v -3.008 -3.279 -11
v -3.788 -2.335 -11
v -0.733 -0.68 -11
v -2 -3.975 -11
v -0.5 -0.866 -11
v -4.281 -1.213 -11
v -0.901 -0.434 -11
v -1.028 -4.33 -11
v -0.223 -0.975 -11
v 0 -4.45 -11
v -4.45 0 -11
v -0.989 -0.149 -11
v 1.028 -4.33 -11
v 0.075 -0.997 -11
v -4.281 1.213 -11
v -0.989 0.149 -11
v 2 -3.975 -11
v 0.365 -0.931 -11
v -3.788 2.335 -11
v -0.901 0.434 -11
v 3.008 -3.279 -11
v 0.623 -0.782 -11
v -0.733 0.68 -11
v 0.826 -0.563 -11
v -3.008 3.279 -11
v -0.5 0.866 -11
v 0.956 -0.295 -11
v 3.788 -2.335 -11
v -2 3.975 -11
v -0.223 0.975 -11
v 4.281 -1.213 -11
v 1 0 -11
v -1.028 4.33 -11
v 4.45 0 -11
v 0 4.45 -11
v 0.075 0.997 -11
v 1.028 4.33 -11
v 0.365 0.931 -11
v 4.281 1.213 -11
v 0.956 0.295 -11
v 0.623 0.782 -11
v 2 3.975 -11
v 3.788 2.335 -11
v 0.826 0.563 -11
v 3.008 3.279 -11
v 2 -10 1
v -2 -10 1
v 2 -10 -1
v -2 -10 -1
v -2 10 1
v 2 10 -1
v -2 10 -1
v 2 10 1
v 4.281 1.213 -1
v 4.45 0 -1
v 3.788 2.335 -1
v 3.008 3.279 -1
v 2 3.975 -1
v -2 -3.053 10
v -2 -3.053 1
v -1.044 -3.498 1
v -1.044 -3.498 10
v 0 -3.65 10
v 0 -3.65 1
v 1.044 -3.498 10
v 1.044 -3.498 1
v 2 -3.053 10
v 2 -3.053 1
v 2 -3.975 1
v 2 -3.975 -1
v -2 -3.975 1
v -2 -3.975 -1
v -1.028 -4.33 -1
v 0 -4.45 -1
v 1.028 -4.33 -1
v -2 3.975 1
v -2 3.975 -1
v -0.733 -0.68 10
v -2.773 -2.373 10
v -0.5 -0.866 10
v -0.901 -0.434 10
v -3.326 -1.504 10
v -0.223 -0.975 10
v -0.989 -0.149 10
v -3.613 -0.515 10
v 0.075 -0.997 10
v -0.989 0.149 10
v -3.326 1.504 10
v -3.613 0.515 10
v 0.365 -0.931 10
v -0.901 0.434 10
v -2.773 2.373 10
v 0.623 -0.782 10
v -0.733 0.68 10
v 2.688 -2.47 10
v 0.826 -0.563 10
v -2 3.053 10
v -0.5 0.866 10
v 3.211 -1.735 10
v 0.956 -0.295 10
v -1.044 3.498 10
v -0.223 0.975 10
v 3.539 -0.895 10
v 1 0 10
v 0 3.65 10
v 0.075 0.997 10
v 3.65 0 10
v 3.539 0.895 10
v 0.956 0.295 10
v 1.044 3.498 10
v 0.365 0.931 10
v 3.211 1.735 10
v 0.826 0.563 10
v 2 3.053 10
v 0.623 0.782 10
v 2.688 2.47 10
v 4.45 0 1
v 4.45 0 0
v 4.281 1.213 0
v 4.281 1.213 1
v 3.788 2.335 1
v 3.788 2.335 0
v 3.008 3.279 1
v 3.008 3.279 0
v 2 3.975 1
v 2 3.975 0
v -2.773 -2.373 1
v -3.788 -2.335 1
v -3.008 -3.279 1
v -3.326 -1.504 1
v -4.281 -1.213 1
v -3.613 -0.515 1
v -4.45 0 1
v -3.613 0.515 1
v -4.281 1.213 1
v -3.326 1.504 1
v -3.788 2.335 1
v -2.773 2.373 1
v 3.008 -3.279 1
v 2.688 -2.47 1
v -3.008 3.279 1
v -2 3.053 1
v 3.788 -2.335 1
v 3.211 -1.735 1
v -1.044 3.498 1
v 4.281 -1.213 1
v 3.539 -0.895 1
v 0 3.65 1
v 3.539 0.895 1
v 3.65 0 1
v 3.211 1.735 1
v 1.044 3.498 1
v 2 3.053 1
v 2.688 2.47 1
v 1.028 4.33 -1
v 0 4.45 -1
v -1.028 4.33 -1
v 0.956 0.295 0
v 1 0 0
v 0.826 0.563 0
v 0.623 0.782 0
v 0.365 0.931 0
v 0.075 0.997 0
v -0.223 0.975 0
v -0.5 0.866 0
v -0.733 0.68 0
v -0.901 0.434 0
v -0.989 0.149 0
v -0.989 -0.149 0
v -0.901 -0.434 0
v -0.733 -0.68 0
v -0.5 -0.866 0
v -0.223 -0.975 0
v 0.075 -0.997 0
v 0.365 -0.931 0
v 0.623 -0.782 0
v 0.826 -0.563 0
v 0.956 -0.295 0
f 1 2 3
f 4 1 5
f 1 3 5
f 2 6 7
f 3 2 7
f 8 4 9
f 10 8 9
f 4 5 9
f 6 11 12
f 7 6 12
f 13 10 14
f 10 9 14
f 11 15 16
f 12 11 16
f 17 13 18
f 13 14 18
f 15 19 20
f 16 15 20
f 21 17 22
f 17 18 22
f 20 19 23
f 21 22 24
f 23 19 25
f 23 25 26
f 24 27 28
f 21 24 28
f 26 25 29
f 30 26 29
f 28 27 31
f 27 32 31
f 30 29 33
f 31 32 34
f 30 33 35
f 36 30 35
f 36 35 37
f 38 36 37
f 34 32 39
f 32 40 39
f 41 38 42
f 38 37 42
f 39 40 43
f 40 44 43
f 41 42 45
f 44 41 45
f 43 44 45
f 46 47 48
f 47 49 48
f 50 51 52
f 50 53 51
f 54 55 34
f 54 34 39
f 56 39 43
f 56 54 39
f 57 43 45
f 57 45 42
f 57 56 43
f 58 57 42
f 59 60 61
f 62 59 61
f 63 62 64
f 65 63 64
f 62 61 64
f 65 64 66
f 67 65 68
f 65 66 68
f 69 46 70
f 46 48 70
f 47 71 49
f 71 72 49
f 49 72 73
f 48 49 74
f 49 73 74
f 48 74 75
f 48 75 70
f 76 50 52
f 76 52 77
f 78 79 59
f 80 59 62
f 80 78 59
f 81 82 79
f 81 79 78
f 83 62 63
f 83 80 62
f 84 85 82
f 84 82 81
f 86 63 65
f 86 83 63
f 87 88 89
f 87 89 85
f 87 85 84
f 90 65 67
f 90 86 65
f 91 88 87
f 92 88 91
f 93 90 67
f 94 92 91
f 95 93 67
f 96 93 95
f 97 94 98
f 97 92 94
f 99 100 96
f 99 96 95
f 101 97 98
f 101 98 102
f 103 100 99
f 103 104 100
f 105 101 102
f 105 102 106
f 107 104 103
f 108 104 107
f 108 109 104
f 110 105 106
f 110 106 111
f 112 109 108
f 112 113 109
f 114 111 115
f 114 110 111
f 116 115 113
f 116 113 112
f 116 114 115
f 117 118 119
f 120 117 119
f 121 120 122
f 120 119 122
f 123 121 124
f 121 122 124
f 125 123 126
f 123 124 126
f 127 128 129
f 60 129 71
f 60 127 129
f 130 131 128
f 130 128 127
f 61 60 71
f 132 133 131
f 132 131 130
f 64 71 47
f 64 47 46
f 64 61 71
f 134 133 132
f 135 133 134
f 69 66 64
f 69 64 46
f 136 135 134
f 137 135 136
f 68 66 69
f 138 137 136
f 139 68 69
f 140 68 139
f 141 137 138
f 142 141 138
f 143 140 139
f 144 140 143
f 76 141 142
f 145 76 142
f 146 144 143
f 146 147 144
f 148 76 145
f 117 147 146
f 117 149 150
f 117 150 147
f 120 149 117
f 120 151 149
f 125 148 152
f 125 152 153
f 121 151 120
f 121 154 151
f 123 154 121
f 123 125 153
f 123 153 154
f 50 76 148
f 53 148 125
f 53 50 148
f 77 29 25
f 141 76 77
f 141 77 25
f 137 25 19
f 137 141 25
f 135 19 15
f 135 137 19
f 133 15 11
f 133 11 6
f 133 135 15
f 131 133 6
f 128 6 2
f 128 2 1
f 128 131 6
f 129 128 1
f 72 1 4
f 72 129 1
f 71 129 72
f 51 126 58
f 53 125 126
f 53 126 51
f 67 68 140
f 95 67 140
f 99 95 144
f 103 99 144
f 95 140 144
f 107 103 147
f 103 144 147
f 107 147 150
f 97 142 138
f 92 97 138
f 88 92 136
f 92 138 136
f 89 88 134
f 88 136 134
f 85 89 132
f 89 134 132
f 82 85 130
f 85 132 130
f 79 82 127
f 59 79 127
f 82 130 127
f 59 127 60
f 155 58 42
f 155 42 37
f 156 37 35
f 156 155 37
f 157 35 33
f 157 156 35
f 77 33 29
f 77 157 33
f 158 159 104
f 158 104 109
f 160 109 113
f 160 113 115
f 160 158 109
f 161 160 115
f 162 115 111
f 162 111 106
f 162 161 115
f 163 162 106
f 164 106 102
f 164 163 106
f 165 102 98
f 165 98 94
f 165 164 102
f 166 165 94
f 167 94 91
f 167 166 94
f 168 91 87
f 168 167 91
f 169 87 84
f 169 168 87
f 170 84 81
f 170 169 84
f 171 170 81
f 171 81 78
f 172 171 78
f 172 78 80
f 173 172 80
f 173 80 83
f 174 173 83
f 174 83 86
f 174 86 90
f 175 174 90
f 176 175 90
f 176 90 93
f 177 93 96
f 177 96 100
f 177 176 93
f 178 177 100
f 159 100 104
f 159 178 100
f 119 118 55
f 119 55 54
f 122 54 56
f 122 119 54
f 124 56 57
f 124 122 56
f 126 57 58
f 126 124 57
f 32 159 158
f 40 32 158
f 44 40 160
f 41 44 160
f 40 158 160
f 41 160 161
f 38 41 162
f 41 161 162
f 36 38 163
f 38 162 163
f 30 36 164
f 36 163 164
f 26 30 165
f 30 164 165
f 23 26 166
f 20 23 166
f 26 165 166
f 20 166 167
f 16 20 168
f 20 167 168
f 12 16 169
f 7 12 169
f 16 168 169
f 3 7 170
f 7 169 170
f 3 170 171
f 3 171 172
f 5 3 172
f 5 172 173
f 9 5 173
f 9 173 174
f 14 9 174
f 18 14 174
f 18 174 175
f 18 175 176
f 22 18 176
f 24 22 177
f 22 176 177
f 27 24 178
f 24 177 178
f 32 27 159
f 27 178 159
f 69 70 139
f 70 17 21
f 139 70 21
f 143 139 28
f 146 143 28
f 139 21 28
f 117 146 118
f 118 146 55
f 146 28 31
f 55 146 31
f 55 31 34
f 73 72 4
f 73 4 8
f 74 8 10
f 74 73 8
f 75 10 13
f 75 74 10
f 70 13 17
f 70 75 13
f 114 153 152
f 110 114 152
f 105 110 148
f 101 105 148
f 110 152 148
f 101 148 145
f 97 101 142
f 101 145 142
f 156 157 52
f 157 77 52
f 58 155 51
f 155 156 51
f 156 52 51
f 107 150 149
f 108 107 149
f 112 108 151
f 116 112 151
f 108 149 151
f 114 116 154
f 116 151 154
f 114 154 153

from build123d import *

# Parameters (mm, degrees)
F0_R     = 1
F1_DEPTH = 11
F2_DEPTH = 1
F3_DEPTH = 10


with BuildPart() as f1:
    # F0 (on Top) → F1 (new body)
    with BuildSketch(Plane.XY):
        with BuildLine():
            Line((-2, 3.0532769282), (-2, 3.9752358421))
            ThreePointArc((-2, 3.9752358421), (-4.45, 0), (-2, -3.9752358421))
            Line((-2, -3.9752358421), (-2, -3.0532769282))
            ThreePointArc((-2, -3.0532769282), (-3.65, 0), (-2, 3.0532769282))
        make_face()
        with BuildLine():
            ThreePointArc((-2, -3.9752358421), (0, -4.45), (2, -3.9752358421))
            Line((2, -3.9752358421), (2, -3.0532769282))
            ThreePointArc((2, -3.0532769282), (0, -3.65), (-2, -3.0532769282))
            Line((-2, -3.0532769282), (-2, -3.9752358421))
        make_face()
        with BuildLine():
            ThreePointArc((2, -3.9752358421), (3.78830437, -2.3347912112), (4.45, 0))
            ThreePointArc((4.45, 0), (3.78830437, 2.3347912112), (2, 3.9752358421))
            Line((2, 3.9752358421), (2, 3.0532769282))
            ThreePointArc((2, 3.0532769282), (3.211113514, 1.7352953639), (3.65, 0))
            ThreePointArc((3.65, 0), (3.211113514, -1.7352953639), (2, -3.0532769282))
            Line((2, -3.0532769282), (2, -3.9752358421))
        make_face()
        with BuildLine():
            Line((2, 3.0532769282), (2, 3.9752358421))
            ThreePointArc((2, 3.9752358421), (0, 4.45), (-2, 3.9752358421))
            Line((-2, 3.9752358421), (-2, 3.0532769282))
            ThreePointArc((-2, 3.0532769282), (0, 3.65), (2, 3.0532769282))
        make_face()
        with BuildLine():
            Line((-2, -3.0532769282), (-2, 3.0532769282))
            ThreePointArc((-2, 3.0532769282), (-3.65, 0), (-2, -3.0532769282))
        make_face()
        with BuildLine():
            Line((2, -3.0532769282), (2, 3.0532769282))
            ThreePointArc((2, 3.0532769282), (0, 3.65), (-2, 3.0532769282))
            Line((-2, 3.0532769282), (-2, -3.0532769282))
            ThreePointArc((-2, -3.0532769282), (0, -3.65), (2, -3.0532769282))
        make_face()
        Circle(F0_R, mode=Mode.SUBTRACT)
        with BuildLine():
            ThreePointArc((3.65, 0), (3.211113514, 1.7352953639), (2, 3.0532769282))
            Line((2, 3.0532769282), (2, -3.0532769282))
            ThreePointArc((2, -3.0532769282), (3.211113514, -1.7352953639), (3.65, 0))
        make_face()
    extrude(amount=-F1_DEPTH)

    # F0 (on Top) → F2 (join, symmetric)
    with BuildSketch(Plane.XY):
        with BuildLine():
            ThreePointArc((-2, 3.9752358421), (0, 4.45), (2, 3.9752358421))
            Line((2, 3.9752358421), (2, 10))
            Line((2, 10), (-2, 10))
            Line((-2, 10), (-2, 3.9752358421))
        make_face()
        with BuildLine():
            Line((2, -10), (2, -3.9752358421))
            ThreePointArc((2, -3.9752358421), (0, -4.45), (-2, -3.9752358421))
            Line((-2, -3.9752358421), (-2, -10))
            Line((-2, -10), (2, -10))
        make_face()
        with BuildLine():
            Line((2, 3.0532769282), (2, 3.9752358421))
            ThreePointArc((2, 3.9752358421), (0, 4.45), (-2, 3.9752358421))
            Line((-2, 3.9752358421), (-2, 3.0532769282))
            ThreePointArc((-2, 3.0532769282), (0, 3.65), (2, 3.0532769282))
        make_face()
        with BuildLine():
            ThreePointArc((-2, -3.9752358421), (0, -4.45), (2, -3.9752358421))
            Line((2, -3.9752358421), (2, -3.0532769282))
            ThreePointArc((2, -3.0532769282), (0, -3.65), (-2, -3.0532769282))
            Line((-2, -3.0532769282), (-2, -3.9752358421))
        make_face()
        with BuildLine():
            Line((-2, 3.0532769282), (-2, 3.9752358421))
            ThreePointArc((-2, 3.9752358421), (-4.45, 0), (-2, -3.9752358421))
            Line((-2, -3.9752358421), (-2, -3.0532769282))
            ThreePointArc((-2, -3.0532769282), (-3.65, 0), (-2, 3.0532769282))
        make_face()
        with BuildLine():
            ThreePointArc((2, -3.9752358421), (3.78830437, -2.3347912112), (4.45, 0))
            ThreePointArc((4.45, 0), (3.78830437, 2.3347912112), (2, 3.9752358421))
            Line((2, 3.9752358421), (2, 3.0532769282))
            ThreePointArc((2, 3.0532769282), (3.211113514, 1.7352953639), (3.65, 0))
            ThreePointArc((3.65, 0), (3.211113514, -1.7352953639), (2, -3.0532769282))
            Line((2, -3.0532769282), (2, -3.9752358421))
        make_face()
    extrude(amount=F2_DEPTH, both=True)

    # F0 (on Top) → F3 (join)
    with BuildSketch(Plane.XY):
        with BuildLine():
            Line((-2, -3.0532769282), (-2, 3.0532769282))
            ThreePointArc((-2, 3.0532769282), (-3.65, 0), (-2, -3.0532769282))
        make_face()
        with BuildLine():
            Line((2, -3.0532769282), (2, 3.0532769282))
            ThreePointArc((2, 3.0532769282), (0, 3.65), (-2, 3.0532769282))
            Line((-2, 3.0532769282), (-2, -3.0532769282))
            ThreePointArc((-2, -3.0532769282), (0, -3.65), (2, -3.0532769282))
        make_face()
        Circle(F0_R, mode=Mode.SUBTRACT)
        with BuildLine():
            ThreePointArc((3.65, 0), (3.211113514, 1.7352953639), (2, 3.0532769282))
            Line((2, 3.0532769282), (2, -3.0532769282))
            ThreePointArc((2, -3.0532769282), (3.211113514, -1.7352953639), (3.65, 0))
        make_face()
    extrude(amount=F3_DEPTH)


solid = f1.part
